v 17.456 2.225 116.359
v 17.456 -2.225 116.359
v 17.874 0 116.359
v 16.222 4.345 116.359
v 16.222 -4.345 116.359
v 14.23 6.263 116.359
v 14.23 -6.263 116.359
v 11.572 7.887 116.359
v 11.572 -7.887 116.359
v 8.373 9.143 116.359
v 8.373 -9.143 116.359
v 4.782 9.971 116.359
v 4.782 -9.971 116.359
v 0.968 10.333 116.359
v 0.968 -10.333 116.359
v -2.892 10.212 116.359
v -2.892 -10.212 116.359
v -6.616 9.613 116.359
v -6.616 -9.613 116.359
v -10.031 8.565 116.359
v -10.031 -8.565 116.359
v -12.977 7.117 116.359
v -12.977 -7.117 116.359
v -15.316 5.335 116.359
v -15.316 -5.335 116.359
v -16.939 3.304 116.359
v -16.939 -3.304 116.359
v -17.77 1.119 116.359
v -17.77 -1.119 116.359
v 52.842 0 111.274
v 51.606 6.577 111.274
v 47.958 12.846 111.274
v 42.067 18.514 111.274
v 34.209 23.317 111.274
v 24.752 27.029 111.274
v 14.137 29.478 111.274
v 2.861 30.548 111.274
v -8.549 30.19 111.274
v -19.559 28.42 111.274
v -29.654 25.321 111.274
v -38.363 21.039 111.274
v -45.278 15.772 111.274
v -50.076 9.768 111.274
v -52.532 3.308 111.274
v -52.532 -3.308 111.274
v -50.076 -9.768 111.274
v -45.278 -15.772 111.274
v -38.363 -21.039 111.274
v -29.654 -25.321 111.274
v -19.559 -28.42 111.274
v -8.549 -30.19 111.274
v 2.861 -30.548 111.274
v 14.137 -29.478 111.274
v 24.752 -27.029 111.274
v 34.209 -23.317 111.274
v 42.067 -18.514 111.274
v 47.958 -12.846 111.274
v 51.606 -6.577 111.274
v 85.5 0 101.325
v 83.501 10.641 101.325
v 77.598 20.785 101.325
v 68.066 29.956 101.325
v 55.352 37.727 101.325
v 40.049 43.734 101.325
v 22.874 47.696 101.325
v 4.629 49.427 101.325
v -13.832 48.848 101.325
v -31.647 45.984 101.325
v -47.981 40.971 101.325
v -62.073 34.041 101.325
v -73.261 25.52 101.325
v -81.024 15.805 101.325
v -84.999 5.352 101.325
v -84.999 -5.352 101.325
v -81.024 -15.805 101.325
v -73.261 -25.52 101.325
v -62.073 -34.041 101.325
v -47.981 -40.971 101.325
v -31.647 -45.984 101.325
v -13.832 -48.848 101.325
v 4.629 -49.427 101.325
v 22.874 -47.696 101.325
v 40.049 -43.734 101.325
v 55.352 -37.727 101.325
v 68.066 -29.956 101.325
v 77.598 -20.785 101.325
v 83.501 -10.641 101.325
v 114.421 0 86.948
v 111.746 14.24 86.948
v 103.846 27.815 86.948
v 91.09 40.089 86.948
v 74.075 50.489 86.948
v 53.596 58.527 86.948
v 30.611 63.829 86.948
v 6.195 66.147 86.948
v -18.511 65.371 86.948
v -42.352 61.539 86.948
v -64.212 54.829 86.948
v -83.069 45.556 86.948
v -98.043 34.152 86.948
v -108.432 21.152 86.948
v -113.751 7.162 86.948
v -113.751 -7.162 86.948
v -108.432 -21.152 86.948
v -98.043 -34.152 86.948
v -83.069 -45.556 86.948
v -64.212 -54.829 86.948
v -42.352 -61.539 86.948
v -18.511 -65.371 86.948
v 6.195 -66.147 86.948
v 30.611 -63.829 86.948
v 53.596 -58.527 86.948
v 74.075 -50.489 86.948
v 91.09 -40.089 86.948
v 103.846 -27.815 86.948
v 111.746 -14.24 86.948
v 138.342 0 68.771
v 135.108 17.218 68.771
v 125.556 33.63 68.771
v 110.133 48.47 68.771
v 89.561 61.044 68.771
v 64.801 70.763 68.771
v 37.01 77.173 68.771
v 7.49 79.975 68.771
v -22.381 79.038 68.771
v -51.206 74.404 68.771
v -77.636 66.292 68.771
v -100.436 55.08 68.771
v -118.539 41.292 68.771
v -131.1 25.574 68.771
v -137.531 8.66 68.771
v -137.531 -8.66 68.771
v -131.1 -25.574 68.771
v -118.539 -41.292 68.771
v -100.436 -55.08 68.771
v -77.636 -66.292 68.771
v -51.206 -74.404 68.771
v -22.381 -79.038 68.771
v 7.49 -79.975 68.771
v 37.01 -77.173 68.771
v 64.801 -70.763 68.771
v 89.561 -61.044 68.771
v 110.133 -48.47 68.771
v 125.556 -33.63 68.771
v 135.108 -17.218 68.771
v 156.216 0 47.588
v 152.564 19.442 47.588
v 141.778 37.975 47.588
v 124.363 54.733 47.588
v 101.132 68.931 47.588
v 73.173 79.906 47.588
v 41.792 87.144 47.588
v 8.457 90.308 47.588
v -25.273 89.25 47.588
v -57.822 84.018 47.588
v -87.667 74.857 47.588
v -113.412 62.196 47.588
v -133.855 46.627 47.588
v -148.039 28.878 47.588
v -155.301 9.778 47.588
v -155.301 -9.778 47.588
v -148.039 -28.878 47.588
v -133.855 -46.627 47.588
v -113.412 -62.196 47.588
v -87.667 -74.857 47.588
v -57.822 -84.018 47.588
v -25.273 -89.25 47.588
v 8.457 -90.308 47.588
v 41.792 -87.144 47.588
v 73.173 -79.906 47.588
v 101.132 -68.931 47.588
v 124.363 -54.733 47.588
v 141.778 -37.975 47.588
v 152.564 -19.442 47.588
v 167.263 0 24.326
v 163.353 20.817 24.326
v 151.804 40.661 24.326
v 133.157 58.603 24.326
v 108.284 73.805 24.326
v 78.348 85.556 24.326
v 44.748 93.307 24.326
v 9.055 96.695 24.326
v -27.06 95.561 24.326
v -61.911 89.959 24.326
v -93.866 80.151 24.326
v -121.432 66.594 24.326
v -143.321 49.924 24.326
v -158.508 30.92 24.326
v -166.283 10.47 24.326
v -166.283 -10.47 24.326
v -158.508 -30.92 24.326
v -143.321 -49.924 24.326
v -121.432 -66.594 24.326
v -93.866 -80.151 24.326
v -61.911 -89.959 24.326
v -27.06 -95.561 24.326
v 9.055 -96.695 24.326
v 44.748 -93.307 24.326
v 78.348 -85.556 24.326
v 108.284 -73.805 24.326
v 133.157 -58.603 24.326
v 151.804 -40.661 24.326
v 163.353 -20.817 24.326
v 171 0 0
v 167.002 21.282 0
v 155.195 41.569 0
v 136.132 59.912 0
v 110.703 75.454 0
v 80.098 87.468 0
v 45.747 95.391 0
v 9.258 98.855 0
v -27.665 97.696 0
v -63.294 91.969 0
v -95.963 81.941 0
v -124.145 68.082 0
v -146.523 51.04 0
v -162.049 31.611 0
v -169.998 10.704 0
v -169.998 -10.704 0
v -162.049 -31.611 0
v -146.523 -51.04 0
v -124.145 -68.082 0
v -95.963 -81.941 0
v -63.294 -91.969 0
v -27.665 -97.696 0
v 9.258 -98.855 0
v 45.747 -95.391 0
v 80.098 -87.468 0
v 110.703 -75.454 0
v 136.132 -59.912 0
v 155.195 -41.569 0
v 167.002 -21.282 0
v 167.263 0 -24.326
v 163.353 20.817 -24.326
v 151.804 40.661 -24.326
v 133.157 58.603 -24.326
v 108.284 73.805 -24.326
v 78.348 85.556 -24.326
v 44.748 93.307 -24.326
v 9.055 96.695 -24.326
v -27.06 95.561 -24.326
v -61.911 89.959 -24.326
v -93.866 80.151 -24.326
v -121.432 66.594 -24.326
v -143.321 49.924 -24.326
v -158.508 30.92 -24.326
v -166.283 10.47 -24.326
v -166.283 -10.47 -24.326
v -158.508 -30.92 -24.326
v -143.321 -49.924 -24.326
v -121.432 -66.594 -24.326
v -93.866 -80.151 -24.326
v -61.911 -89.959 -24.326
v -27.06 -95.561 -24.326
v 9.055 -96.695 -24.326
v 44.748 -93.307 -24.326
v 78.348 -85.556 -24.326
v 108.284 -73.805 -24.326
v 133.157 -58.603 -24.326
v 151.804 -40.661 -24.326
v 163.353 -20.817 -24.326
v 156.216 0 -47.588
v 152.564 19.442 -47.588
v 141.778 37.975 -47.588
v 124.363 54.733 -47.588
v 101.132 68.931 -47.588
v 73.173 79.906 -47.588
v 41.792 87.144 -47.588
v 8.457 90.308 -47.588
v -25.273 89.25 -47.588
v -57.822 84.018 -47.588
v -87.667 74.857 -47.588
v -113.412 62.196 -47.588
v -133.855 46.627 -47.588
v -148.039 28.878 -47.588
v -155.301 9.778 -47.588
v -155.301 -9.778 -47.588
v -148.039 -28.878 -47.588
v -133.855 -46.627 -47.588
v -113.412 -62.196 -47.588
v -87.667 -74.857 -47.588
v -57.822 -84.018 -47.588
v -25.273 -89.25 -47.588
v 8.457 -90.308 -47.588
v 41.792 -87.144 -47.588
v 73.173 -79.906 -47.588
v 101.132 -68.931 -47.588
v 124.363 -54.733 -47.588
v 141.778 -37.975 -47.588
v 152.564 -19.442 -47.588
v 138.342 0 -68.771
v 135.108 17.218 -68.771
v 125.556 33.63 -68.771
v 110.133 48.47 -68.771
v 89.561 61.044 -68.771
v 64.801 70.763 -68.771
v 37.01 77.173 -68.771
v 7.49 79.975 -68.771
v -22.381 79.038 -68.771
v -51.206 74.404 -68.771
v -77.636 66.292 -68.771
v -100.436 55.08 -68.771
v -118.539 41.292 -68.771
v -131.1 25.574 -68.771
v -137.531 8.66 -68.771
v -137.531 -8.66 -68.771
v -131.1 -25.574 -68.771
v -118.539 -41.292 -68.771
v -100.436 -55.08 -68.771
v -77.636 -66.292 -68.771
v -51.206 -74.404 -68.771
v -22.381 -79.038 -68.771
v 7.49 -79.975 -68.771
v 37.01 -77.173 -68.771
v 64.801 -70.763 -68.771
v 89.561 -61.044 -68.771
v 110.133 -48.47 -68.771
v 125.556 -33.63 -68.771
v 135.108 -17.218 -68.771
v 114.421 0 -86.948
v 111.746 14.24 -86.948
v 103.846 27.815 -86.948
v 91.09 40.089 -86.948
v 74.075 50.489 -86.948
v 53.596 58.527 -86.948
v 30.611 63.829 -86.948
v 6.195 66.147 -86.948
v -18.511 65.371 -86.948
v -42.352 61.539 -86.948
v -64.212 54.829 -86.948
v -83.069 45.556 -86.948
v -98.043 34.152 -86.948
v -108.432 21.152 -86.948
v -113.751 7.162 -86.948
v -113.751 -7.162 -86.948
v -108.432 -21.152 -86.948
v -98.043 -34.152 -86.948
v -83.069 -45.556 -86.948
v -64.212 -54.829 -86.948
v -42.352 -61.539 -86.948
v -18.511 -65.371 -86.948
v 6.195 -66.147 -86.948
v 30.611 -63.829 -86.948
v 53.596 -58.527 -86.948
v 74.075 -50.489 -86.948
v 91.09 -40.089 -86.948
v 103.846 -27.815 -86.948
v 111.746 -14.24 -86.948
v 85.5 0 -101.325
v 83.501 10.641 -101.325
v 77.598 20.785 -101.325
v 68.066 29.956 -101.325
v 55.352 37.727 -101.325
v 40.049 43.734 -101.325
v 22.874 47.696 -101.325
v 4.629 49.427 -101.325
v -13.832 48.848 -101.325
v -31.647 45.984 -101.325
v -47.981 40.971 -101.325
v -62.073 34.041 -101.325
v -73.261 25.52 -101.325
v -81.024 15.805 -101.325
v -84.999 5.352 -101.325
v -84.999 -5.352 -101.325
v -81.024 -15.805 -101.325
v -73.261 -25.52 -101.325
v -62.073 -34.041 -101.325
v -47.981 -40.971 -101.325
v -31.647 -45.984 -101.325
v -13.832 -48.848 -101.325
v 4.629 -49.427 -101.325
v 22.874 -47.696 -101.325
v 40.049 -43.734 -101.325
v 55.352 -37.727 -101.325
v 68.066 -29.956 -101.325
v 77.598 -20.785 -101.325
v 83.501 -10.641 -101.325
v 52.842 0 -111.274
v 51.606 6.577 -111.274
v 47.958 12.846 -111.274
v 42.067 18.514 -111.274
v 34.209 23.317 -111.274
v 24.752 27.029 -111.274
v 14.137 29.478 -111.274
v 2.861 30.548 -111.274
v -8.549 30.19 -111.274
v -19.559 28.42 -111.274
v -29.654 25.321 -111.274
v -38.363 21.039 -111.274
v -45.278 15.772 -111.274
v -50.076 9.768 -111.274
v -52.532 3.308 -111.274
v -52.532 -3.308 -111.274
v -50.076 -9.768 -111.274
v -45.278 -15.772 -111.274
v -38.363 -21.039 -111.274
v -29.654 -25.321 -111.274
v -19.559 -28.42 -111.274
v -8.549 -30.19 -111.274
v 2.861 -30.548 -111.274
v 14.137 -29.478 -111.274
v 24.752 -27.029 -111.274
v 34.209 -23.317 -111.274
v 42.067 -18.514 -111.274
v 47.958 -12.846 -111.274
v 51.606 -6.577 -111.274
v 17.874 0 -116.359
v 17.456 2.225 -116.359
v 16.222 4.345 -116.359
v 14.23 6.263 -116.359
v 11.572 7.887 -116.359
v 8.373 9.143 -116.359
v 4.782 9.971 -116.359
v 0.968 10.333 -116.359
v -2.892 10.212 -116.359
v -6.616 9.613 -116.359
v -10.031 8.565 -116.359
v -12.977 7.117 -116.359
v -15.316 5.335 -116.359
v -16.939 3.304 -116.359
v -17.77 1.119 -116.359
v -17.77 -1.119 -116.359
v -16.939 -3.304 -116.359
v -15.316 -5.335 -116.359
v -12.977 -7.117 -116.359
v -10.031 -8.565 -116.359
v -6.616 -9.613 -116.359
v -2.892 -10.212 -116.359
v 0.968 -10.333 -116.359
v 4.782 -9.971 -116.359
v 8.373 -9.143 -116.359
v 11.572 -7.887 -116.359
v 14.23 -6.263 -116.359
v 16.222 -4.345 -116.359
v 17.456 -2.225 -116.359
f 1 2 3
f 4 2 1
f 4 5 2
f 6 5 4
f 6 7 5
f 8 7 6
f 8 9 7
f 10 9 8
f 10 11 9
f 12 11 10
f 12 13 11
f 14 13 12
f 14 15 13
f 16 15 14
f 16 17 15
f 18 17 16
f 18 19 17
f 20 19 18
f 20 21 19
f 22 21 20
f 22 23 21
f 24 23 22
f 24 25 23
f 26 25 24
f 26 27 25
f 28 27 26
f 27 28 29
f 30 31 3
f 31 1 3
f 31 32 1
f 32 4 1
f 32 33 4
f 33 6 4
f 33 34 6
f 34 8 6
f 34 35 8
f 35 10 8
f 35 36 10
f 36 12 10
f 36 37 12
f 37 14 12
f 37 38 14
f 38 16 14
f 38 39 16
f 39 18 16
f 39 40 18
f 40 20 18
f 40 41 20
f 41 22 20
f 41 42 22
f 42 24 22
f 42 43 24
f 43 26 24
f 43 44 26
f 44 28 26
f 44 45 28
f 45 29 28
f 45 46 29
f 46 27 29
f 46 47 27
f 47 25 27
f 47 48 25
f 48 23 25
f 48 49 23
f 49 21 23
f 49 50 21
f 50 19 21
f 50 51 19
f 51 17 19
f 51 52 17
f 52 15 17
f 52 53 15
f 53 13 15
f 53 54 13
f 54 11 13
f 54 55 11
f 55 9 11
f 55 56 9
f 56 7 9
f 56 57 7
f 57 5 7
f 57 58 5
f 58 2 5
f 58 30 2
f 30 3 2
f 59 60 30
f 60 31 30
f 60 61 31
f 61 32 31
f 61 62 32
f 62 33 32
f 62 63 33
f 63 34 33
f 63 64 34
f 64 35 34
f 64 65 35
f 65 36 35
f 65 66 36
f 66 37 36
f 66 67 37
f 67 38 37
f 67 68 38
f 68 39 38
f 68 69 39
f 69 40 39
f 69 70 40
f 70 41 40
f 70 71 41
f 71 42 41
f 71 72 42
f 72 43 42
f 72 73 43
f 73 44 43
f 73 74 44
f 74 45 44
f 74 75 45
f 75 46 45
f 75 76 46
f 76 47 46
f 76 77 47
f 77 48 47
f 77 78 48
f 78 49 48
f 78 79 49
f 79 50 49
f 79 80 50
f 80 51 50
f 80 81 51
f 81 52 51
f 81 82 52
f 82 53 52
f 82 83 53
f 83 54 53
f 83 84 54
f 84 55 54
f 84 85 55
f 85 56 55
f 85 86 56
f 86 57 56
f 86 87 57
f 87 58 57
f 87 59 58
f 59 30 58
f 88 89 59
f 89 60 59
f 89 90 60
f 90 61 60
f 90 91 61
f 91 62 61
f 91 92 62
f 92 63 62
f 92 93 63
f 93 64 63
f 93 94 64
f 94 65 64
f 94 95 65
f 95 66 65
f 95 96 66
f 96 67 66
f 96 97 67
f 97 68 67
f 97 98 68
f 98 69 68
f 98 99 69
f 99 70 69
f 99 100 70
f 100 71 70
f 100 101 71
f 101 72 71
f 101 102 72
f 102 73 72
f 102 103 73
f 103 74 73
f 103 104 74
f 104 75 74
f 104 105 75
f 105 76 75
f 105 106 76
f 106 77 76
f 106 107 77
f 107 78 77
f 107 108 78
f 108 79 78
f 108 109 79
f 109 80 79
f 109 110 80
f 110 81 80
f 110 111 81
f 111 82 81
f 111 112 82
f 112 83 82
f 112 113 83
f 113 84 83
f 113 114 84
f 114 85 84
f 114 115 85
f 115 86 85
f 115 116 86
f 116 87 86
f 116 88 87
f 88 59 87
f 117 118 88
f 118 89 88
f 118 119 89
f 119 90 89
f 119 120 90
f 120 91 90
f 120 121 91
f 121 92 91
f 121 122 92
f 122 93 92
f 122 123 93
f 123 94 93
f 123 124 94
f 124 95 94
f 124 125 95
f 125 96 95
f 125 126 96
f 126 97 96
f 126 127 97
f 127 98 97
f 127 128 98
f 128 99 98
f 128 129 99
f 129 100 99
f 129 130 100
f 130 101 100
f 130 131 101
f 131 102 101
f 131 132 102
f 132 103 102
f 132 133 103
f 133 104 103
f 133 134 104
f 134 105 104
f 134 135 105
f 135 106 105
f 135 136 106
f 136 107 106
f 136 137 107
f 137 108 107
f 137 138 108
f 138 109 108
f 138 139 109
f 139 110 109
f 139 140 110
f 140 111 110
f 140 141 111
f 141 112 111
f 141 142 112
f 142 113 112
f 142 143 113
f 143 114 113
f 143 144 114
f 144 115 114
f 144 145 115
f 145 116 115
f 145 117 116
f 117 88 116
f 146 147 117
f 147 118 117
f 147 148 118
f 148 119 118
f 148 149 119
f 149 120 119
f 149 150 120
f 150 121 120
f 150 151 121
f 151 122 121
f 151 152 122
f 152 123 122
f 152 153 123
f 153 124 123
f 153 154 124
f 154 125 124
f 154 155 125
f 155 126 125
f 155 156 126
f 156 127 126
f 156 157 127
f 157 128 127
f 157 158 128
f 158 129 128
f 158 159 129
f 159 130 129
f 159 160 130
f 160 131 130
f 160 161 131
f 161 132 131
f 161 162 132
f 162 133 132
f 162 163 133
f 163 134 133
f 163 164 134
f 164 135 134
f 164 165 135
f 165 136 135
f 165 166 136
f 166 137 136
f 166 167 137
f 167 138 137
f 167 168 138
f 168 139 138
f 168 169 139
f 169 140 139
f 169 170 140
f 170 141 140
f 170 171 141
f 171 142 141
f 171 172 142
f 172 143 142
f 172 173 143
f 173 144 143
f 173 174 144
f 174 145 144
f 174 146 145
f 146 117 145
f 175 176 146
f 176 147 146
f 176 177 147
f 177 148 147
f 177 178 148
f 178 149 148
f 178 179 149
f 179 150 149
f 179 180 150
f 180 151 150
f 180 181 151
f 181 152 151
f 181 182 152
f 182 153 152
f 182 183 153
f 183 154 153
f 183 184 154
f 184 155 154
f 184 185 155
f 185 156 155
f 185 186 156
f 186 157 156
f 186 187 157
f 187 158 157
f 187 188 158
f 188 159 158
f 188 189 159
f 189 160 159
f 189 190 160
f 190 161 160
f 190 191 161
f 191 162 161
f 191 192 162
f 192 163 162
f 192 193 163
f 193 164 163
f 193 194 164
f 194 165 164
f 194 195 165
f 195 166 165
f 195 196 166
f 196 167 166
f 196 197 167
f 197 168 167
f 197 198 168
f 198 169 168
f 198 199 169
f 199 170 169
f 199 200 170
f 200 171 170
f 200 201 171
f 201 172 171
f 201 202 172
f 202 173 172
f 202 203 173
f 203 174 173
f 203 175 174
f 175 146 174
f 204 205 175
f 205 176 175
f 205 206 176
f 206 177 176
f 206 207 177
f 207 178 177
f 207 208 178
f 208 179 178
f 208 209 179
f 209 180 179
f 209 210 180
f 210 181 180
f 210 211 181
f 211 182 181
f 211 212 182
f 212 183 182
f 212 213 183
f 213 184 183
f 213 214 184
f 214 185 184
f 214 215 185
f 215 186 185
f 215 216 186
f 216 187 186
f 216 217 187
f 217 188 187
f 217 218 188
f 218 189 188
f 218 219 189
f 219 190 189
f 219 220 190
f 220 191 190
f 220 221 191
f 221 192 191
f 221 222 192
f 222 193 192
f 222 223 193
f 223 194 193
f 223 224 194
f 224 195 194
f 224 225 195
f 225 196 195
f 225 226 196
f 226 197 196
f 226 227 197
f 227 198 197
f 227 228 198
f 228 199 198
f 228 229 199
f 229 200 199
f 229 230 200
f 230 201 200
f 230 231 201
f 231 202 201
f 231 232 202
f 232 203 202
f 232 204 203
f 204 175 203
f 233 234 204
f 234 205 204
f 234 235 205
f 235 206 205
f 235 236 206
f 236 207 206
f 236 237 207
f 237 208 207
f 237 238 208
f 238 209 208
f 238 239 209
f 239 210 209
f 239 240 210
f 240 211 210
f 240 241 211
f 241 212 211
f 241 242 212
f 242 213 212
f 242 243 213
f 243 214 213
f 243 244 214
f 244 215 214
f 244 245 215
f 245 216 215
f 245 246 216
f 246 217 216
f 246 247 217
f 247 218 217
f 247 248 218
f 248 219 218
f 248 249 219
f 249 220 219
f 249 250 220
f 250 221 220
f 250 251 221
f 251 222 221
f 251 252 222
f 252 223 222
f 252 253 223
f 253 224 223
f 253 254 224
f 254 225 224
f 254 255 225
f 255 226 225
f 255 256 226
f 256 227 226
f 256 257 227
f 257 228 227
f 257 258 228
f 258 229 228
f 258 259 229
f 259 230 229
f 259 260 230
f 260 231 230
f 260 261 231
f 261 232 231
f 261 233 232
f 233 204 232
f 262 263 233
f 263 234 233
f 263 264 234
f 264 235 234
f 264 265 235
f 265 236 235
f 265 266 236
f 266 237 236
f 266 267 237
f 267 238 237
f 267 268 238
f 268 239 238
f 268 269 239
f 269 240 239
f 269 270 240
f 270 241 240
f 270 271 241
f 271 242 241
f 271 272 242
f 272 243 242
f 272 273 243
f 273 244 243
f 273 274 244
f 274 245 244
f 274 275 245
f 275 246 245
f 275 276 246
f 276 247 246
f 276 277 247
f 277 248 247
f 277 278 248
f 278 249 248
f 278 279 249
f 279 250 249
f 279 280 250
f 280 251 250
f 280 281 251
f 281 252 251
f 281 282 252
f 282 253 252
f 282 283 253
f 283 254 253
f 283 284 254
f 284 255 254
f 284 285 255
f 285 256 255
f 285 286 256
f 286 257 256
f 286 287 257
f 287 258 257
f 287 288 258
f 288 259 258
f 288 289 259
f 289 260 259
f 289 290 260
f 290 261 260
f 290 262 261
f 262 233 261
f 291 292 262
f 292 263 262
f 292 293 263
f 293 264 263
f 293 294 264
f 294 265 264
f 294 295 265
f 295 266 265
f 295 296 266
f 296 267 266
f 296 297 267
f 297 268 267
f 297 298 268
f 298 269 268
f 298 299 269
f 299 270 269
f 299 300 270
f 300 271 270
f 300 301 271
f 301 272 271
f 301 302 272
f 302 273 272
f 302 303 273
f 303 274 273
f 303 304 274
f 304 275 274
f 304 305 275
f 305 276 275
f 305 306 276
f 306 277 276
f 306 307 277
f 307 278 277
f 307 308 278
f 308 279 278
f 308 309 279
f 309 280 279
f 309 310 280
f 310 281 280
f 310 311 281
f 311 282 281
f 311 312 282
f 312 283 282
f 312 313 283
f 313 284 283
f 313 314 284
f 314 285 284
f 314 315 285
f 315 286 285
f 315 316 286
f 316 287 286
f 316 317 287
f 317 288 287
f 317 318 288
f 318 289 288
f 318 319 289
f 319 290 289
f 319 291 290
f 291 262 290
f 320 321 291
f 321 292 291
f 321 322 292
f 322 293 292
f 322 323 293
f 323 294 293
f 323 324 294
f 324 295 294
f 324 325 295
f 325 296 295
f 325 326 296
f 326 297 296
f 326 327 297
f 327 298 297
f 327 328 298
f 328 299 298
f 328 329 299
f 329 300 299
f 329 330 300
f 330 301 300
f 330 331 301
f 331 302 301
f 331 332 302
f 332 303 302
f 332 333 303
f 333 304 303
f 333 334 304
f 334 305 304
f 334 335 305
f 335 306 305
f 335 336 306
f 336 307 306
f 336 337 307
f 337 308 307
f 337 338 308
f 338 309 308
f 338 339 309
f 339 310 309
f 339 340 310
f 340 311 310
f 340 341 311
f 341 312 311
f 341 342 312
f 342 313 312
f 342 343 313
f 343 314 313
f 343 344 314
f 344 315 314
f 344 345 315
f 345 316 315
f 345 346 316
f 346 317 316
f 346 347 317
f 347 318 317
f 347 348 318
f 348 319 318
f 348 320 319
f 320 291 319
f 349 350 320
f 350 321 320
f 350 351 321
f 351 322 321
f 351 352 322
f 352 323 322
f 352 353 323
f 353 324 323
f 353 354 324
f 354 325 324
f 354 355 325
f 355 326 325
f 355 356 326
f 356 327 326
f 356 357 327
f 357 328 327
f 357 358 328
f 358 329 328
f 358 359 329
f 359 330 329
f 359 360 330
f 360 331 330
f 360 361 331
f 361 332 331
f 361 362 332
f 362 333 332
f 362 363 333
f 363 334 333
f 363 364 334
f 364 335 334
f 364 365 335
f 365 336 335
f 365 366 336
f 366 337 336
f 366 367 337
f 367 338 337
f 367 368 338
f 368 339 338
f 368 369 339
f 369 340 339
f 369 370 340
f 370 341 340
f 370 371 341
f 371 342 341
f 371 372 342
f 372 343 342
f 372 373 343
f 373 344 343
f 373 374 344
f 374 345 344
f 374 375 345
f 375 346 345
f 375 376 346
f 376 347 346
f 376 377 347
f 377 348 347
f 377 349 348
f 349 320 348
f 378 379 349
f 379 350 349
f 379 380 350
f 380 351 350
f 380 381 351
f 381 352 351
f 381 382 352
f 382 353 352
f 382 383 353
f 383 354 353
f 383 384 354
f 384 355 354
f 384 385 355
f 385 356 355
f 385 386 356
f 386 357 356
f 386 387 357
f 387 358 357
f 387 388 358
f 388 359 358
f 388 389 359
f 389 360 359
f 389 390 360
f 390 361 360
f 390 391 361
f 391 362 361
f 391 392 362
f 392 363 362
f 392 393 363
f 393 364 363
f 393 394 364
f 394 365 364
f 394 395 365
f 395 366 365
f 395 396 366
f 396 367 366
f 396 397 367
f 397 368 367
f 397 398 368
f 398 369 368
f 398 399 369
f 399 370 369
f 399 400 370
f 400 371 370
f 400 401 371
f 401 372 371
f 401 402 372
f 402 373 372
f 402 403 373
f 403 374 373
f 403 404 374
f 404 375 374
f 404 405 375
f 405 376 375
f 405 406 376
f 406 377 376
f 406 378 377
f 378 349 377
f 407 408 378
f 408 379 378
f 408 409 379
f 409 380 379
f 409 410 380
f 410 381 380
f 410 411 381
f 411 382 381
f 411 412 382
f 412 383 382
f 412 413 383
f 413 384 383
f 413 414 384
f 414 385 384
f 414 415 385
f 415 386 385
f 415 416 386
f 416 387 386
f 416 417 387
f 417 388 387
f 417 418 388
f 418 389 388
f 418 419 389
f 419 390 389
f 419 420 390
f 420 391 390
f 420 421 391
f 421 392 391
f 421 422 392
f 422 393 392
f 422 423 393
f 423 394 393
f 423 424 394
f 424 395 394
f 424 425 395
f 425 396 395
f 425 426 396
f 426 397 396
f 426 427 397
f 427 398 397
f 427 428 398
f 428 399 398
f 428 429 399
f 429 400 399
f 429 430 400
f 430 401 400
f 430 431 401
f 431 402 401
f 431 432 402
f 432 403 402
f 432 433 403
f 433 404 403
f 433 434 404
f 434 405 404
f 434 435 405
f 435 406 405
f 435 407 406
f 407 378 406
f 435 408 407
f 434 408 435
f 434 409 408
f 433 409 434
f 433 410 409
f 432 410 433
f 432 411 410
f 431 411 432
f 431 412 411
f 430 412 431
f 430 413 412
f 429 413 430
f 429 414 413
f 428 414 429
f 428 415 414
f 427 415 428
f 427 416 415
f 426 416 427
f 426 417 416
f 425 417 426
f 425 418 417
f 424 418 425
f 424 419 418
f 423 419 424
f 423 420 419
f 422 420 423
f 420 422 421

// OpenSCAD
// Generated by SolidPython 1.0.1 on 2020-07-29 00:46:54


scale(v = [19, 11, 13]) {
	sphere(r = 9);
}
/***********************************************
*********      SolidPython code:      **********
************************************************
 
# import packages: SolidPython
from solid import *
from solid.utils import *
from itertools import chain, combinations, permutations


class Resize:

    def __init__(self, scad_file):
        self.scad_file = scad_file
        #self.scad_file = import_scad(scad_file)
        # cone/cylinder param:
        self.r1 = 0
        self.r2 = 0
        self.h = 0
        # rectangular prism param:
        self.w = 0
        self.l = 0
        # ellipse param:
        self.r = 0

    # import OpenScad code (file name corresponds to shape)


    # classify shape + parameters
    def assign(self, param1, param2, param3):
        if self.scad_file == 'cone.scad':
            self.r1 = param1
            self.r2 = param2
            self.h = param3
        elif self.scad_file == 'cylinder.scad':
            self.r1 = param1
            self.r2 = param2
            self.h = param3
        elif self.scad_file == 'rectangularPrism.scad':
            self.h = param1
            self.l = param2
            self.w = param3
        else:
            self.r = param1
            self.h = param2

    # resize parameters
    def iterate(self):
        x = range(3, 20, 2)
        i = 1
        if self.scad_file == 'cone.scad':
            tempList = list(permutations(x, 2))
            for temp in tempList:
                param1 = temp[0]
                param2 = temp[1]
                filepath = 'produced_scad_files/' + 'cone' + str(param1) + '_' + str(param2) + '_' + '.scad'
                scad_render_to_file(cylinder(h=param1, r1=param2, r2=0), filepath)

        elif self.scad_file == 'cylinder.scad':
            tempList = list(permutations(x, 3))
            for temp in tempList:
                param1 = temp[0]
                param2 = temp[1]
                filepath = 'produced_scad_files/' + 'cylinder' + str(param1) + '_' + str(param2) + '_' + '.scad'
                scad_render_to_file(cylinder(h=param1, r1=param2, r2=param2), filepath)

        elif self.scad_file == 'rectangularPrism.scad':
            tempList = list(permutations(x, 3))
            for temp in tempList:
                param1 = temp[0]
                param2 = temp[1]
                param3 = temp[2]
                filepath = 'produced_scad_files/' + 'rectangularPrism' + str(param1) + '_' + str(param2) + '_' + str(
                    param3) + '.scad'
                scad_render_to_file(cube(size=(param1, param2, param3)), filepath)

        elif self.scad_file == 'ellipse.scad':
            tempList = list(permutations(x, 4))
            for temp in tempList:
                param1 = temp[0]
                param2 = temp[1]
                param3 = temp[2]
                param4 = temp[3]
                filepath = 'produced_scad_files/' + 'ellipse' + str(param1) + '_' + str(param2) + '_' + str(param3) + '_' + str(param4) + '.scad'
                scad_render_to_file(scale([param1, param2, param3])(sphere(r=param4)), filepath)

    def render_to_scadfile(self):
        scad_render_to_file(scad, 'example.scad') 
 
************************************************/
